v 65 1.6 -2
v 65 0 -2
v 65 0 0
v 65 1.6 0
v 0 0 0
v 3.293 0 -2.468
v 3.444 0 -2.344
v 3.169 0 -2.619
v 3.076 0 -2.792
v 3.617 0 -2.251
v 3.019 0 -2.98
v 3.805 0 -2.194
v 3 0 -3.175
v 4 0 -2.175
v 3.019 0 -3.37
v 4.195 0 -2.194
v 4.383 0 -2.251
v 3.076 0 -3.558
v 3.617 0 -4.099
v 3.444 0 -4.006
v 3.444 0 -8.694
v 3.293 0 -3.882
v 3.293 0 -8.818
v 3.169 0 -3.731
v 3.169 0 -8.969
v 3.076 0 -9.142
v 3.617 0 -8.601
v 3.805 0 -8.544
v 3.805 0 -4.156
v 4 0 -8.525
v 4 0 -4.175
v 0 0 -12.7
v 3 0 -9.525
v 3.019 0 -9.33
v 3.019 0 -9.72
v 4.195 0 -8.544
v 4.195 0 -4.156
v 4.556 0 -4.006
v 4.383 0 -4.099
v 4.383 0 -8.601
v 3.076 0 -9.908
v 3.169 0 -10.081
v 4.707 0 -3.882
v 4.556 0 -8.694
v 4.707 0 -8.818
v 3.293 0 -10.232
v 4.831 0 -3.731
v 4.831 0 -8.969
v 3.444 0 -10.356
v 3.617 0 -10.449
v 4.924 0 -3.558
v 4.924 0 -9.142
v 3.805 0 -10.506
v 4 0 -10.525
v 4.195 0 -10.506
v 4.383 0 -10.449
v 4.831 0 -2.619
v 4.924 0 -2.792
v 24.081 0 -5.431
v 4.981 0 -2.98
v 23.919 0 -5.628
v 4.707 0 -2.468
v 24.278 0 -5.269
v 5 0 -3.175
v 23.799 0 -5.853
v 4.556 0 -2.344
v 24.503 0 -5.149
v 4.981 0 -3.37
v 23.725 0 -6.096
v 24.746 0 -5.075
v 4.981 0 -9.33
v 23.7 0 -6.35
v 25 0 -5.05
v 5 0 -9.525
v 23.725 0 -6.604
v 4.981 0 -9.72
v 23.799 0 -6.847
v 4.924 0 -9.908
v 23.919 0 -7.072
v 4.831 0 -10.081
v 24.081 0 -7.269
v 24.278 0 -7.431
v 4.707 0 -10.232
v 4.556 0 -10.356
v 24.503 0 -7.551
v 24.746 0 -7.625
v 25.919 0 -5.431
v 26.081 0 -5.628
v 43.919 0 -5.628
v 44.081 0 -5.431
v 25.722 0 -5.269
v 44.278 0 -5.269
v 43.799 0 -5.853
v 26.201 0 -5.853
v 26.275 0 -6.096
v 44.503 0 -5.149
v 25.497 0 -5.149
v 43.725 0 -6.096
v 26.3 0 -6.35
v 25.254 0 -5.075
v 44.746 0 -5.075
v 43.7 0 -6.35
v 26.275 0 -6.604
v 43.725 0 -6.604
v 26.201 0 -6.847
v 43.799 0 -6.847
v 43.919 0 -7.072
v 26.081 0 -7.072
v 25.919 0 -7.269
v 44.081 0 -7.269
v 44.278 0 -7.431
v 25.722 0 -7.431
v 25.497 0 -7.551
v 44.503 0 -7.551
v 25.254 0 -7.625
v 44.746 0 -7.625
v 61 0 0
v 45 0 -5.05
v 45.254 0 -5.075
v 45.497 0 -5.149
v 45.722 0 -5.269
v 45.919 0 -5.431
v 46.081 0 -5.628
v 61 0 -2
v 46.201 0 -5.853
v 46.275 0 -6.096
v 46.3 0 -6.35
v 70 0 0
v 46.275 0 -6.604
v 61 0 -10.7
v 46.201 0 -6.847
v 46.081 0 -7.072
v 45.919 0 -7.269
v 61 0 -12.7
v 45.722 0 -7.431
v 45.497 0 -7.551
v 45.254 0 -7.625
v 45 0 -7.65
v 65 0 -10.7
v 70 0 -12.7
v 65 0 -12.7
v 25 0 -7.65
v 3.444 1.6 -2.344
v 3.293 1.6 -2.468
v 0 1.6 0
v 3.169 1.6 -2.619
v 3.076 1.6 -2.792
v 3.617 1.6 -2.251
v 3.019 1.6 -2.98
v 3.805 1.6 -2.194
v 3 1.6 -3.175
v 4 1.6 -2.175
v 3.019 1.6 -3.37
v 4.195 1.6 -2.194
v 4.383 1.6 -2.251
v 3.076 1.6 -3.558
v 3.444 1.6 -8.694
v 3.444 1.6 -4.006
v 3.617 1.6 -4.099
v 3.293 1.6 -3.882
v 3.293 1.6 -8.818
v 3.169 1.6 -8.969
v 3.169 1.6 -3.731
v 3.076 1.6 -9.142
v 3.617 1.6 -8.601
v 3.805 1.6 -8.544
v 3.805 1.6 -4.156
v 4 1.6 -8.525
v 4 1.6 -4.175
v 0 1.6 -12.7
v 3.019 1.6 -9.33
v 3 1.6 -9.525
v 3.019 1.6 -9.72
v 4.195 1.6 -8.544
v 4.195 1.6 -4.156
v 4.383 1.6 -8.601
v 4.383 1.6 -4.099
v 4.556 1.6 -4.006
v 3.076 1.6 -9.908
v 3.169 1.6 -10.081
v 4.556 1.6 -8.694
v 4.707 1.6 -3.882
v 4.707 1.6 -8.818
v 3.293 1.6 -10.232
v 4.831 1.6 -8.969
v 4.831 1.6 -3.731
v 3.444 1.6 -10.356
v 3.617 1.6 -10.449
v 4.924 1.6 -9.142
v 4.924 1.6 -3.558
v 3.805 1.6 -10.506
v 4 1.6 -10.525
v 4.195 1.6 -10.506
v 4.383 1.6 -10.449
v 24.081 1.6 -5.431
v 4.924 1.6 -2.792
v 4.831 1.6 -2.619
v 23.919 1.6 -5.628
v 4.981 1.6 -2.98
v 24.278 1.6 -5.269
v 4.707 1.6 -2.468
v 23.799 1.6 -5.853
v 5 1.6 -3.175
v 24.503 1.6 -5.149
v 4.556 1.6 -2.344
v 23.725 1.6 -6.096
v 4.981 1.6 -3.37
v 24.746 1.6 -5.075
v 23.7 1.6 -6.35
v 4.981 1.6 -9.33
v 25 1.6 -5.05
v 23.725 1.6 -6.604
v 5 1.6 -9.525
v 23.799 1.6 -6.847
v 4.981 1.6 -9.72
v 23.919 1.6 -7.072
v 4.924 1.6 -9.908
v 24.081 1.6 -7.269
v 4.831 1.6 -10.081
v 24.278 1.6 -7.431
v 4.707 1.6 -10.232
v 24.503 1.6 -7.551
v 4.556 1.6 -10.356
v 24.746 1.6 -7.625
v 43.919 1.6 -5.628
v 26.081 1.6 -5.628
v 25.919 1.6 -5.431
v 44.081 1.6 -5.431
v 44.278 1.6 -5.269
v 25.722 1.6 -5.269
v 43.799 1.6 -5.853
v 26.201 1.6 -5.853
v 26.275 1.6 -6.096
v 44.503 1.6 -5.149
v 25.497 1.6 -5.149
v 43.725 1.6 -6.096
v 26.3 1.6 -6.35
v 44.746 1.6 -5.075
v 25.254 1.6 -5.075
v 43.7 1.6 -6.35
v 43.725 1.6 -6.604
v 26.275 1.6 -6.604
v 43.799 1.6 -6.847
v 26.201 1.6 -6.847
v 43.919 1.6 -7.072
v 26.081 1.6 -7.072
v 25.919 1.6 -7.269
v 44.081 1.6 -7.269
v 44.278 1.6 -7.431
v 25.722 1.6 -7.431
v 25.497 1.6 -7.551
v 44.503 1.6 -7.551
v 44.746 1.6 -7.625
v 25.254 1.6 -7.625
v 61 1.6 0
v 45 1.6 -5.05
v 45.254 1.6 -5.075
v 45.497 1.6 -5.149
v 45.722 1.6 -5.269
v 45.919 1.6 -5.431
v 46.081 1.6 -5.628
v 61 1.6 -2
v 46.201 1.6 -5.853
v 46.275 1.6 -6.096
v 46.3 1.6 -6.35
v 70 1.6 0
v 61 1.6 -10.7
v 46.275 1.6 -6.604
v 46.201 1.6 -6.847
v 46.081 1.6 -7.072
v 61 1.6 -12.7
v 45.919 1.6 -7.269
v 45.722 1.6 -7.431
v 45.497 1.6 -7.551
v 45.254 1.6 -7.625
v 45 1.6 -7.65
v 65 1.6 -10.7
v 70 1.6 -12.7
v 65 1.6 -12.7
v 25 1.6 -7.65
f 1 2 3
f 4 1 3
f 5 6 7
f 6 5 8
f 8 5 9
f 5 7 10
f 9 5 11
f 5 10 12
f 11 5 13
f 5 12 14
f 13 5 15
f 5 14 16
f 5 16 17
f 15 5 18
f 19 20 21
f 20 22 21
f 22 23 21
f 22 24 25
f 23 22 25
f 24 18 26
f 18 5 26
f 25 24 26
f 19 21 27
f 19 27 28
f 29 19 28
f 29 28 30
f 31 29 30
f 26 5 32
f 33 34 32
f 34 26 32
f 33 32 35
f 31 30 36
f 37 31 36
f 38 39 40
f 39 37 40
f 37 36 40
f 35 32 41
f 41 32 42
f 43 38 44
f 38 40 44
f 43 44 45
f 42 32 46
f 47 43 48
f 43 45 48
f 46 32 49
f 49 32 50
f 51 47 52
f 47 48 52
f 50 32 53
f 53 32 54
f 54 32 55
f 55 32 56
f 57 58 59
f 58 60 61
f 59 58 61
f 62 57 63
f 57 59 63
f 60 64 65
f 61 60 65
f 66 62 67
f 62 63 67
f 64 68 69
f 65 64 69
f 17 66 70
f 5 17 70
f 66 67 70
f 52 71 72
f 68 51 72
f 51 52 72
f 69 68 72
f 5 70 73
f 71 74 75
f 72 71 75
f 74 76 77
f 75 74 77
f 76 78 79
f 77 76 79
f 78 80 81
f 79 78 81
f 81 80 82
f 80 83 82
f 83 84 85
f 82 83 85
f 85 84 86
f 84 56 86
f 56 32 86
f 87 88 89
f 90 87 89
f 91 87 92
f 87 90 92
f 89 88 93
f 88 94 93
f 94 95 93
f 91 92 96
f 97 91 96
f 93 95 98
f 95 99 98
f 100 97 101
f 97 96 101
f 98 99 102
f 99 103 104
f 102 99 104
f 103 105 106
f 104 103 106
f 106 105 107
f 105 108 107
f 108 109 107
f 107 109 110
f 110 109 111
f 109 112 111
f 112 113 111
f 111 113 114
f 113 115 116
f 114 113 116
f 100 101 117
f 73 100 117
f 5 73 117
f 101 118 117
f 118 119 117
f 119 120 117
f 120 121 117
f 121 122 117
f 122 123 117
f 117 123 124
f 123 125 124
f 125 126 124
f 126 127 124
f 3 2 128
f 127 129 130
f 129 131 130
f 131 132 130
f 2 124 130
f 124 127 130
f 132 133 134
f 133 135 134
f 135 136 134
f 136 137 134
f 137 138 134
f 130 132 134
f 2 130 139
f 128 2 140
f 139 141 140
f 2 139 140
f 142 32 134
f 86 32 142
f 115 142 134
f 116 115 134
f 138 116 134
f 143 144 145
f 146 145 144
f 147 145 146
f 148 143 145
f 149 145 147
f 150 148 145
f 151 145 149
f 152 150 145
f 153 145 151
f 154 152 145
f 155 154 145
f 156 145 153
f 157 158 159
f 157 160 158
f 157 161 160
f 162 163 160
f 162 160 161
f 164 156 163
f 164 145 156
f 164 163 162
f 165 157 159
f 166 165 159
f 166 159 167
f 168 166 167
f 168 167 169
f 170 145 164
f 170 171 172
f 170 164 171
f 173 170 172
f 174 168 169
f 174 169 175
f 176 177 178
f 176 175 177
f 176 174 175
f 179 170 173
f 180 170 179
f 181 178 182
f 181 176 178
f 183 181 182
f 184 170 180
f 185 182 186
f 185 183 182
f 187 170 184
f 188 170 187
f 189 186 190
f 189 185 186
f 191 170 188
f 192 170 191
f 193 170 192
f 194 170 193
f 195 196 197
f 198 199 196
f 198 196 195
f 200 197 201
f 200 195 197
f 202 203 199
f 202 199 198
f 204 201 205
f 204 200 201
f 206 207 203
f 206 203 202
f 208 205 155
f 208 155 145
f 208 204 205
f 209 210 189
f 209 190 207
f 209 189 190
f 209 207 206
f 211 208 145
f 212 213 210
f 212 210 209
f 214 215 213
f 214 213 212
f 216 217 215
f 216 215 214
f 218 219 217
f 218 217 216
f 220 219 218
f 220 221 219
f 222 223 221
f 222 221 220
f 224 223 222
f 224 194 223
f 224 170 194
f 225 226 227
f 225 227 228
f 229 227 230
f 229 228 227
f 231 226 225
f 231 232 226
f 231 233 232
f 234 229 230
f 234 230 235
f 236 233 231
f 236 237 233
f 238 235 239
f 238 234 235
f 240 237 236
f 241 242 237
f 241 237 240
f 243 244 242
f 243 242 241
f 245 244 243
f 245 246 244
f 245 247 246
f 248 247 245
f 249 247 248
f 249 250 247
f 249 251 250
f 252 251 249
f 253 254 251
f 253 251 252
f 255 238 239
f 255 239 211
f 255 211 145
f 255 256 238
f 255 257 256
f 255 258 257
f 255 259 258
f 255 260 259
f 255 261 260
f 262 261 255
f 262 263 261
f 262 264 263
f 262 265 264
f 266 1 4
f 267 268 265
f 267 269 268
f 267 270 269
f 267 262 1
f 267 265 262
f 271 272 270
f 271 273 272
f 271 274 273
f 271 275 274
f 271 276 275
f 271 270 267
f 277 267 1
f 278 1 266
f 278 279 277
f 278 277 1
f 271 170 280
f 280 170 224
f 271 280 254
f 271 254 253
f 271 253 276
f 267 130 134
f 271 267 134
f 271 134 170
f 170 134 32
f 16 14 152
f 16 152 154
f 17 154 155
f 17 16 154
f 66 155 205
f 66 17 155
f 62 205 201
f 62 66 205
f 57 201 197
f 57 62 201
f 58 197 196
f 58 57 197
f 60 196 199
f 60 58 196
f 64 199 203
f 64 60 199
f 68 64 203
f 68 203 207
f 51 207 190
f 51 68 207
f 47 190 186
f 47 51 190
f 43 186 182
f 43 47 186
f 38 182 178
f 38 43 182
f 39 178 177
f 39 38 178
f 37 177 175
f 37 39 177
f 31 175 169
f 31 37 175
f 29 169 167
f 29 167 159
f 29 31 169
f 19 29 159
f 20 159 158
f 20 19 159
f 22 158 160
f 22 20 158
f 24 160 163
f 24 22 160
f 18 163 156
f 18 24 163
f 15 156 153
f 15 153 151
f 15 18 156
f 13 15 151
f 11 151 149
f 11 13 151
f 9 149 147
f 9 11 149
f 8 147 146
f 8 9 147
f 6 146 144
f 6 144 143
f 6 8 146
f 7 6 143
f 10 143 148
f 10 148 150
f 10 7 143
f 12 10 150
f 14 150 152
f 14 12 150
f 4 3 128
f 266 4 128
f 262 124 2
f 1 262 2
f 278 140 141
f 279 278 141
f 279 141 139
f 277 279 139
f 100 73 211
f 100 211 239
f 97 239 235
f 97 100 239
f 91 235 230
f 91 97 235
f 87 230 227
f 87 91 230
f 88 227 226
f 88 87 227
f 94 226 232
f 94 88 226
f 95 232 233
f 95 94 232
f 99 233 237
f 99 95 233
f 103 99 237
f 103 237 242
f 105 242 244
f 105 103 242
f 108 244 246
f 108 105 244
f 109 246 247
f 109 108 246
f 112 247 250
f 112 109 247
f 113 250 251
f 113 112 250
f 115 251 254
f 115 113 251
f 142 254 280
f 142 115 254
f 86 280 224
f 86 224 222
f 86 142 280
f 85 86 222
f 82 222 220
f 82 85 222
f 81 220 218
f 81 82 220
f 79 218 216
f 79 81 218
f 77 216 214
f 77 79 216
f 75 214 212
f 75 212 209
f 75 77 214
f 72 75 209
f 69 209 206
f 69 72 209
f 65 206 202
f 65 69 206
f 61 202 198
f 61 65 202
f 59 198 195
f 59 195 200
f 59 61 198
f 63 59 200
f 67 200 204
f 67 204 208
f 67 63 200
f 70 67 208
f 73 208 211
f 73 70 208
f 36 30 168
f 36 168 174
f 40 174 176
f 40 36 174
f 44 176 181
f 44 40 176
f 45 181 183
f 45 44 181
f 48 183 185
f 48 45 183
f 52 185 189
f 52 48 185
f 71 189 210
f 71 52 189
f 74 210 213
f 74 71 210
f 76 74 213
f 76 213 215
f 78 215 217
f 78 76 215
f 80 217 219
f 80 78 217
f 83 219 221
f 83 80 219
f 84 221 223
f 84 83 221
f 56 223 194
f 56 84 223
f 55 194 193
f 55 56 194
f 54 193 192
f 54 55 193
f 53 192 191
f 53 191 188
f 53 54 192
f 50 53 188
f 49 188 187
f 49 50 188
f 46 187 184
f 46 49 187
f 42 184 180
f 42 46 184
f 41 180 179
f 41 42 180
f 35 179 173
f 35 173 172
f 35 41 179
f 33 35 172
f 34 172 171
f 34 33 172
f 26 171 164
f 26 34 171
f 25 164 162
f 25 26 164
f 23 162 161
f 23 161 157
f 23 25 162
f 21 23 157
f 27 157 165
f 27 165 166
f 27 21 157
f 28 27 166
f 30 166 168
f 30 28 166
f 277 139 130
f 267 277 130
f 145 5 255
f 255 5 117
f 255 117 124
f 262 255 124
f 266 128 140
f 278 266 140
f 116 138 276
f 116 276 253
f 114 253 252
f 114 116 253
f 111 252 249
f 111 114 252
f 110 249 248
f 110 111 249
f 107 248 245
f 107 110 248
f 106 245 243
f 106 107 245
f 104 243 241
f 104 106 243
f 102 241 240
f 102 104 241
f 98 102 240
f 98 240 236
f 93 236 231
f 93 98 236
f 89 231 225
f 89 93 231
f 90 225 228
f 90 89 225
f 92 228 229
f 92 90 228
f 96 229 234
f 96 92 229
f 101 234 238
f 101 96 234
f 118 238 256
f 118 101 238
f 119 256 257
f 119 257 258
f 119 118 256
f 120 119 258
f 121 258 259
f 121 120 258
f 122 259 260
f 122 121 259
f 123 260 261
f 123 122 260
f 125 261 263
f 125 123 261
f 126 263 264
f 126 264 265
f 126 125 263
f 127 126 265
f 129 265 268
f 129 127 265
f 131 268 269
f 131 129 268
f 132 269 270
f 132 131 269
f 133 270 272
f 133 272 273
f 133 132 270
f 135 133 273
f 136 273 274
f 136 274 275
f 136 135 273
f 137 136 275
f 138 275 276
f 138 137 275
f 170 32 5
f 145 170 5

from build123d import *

# Parameters (mm, degrees)
SKETCH1_R           = 1
SKETCH1_R_2         = 1.3
BOSS_EXTRUDE1_DEPTH = 1.6


with BuildPart() as part:
    # Sketch1 → Boss-Extrude1 (new body)
    with BuildSketch(Plane(origin=(0, 0, 0), x_dir=(1, 0, 0), z_dir=(0, 1, 0))):
        Polygon((0, 0), (61, 0), (61, 2), (65, 2), (65, 0), (70, 0), (70, 12.7), (65, 12.7), (65, 10.7), (61, 10.7), (61, 12.7), (0, 12.7), align=None)
        with Locations(Location((4, 9.525, 0), (0, 0, 270))):
            Circle(SKETCH1_R, mode=Mode.SUBTRACT)
        with Locations(Location((4, 3.175, 0), (0, 0, 270))):
            Circle(SKETCH1_R, mode=Mode.SUBTRACT)
        with Locations(Location((25, 6.35, 0), (0, 0, 270))):
            Circle(SKETCH1_R_2, mode=Mode.SUBTRACT)
        with Locations(Location((45, 6.35, 0), (0, 0, 90))):
            Circle(SKETCH1_R_2, mode=Mode.SUBTRACT)
    extrude(amount=BOSS_EXTRUDE1_DEPTH)


solid = part.part
